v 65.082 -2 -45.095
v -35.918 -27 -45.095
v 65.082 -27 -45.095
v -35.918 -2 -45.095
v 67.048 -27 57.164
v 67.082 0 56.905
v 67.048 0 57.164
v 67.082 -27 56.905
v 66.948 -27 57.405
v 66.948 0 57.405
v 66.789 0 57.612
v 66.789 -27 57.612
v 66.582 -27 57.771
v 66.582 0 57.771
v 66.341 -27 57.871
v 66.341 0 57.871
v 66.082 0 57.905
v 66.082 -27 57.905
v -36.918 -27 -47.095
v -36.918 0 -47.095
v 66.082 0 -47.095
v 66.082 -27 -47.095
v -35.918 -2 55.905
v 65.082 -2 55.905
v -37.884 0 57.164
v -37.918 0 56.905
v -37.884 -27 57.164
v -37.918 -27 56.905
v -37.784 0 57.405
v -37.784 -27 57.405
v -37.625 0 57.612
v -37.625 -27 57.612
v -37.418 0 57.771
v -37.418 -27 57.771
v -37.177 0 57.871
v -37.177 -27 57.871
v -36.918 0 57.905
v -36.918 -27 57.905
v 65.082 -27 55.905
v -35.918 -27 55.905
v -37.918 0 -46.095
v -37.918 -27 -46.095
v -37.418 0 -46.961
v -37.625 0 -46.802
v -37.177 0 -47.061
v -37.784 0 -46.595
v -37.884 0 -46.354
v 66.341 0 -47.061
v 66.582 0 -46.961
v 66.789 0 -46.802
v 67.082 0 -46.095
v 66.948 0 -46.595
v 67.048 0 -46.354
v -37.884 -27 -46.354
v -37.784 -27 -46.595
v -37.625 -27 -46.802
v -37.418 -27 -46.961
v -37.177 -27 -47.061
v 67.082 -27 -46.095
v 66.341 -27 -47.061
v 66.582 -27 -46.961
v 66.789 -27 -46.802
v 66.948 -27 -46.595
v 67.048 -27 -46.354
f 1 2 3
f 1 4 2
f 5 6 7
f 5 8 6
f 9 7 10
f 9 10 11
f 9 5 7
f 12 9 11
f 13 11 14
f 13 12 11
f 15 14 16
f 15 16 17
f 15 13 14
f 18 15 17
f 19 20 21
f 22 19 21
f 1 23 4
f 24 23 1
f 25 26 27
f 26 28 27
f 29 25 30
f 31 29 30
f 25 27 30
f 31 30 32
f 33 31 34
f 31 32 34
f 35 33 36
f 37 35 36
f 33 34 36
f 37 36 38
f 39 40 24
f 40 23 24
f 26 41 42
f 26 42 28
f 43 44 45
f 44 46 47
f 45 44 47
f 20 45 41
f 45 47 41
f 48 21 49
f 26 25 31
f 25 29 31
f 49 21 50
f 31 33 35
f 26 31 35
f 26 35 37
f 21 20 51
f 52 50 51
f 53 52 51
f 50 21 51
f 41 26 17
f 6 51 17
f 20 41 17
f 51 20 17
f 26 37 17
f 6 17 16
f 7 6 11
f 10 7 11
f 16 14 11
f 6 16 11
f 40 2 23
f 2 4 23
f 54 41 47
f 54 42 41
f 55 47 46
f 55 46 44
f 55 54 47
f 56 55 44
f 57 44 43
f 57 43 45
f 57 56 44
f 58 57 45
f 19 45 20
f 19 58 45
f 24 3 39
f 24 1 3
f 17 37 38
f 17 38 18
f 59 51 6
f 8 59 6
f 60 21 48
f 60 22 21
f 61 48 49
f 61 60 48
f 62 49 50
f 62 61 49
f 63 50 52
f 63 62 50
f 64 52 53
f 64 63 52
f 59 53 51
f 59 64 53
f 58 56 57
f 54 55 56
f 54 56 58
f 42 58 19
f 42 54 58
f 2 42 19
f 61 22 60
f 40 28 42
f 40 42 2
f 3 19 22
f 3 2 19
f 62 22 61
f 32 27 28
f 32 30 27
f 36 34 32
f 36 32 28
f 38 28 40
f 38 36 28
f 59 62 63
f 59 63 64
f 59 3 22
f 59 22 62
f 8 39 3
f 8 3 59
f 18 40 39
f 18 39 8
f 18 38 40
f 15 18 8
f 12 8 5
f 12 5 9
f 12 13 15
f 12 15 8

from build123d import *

# Parameters (mm, degrees)
F0_W     = 105
F0_H     = 105
F1_DEPTH = 27
F2_T     = -2
F3_R     = 1


with BuildPart() as f1:
    # F0 (on Front) → F1 (new body)
    with BuildSketch(Plane.XZ):
        with Locations((14.582235, 5.405142)):
            Rectangle(F0_W, F0_H)
    extrude(amount=F1_DEPTH)

    # F2
    f2_openings = [f1.faces().sort_by_distance(p)[0] for p in [
        (14.582235, -27, 5.405142),
    ]]
    offset(amount=F2_T, openings=f2_openings)

    # F3
    f3_edges = [f1.edges().sort_by_distance(p)[0] for p in [
        (67.082235, -13.5, 57.905142),
        (67.082235, -13.5, -47.094858),
        (-37.917765, -13.5, 57.905142),
        (-37.917765, -13.5, -47.094858),
    ]]
    fillet(f3_edges, radius=F3_R)


solid = f1.part
